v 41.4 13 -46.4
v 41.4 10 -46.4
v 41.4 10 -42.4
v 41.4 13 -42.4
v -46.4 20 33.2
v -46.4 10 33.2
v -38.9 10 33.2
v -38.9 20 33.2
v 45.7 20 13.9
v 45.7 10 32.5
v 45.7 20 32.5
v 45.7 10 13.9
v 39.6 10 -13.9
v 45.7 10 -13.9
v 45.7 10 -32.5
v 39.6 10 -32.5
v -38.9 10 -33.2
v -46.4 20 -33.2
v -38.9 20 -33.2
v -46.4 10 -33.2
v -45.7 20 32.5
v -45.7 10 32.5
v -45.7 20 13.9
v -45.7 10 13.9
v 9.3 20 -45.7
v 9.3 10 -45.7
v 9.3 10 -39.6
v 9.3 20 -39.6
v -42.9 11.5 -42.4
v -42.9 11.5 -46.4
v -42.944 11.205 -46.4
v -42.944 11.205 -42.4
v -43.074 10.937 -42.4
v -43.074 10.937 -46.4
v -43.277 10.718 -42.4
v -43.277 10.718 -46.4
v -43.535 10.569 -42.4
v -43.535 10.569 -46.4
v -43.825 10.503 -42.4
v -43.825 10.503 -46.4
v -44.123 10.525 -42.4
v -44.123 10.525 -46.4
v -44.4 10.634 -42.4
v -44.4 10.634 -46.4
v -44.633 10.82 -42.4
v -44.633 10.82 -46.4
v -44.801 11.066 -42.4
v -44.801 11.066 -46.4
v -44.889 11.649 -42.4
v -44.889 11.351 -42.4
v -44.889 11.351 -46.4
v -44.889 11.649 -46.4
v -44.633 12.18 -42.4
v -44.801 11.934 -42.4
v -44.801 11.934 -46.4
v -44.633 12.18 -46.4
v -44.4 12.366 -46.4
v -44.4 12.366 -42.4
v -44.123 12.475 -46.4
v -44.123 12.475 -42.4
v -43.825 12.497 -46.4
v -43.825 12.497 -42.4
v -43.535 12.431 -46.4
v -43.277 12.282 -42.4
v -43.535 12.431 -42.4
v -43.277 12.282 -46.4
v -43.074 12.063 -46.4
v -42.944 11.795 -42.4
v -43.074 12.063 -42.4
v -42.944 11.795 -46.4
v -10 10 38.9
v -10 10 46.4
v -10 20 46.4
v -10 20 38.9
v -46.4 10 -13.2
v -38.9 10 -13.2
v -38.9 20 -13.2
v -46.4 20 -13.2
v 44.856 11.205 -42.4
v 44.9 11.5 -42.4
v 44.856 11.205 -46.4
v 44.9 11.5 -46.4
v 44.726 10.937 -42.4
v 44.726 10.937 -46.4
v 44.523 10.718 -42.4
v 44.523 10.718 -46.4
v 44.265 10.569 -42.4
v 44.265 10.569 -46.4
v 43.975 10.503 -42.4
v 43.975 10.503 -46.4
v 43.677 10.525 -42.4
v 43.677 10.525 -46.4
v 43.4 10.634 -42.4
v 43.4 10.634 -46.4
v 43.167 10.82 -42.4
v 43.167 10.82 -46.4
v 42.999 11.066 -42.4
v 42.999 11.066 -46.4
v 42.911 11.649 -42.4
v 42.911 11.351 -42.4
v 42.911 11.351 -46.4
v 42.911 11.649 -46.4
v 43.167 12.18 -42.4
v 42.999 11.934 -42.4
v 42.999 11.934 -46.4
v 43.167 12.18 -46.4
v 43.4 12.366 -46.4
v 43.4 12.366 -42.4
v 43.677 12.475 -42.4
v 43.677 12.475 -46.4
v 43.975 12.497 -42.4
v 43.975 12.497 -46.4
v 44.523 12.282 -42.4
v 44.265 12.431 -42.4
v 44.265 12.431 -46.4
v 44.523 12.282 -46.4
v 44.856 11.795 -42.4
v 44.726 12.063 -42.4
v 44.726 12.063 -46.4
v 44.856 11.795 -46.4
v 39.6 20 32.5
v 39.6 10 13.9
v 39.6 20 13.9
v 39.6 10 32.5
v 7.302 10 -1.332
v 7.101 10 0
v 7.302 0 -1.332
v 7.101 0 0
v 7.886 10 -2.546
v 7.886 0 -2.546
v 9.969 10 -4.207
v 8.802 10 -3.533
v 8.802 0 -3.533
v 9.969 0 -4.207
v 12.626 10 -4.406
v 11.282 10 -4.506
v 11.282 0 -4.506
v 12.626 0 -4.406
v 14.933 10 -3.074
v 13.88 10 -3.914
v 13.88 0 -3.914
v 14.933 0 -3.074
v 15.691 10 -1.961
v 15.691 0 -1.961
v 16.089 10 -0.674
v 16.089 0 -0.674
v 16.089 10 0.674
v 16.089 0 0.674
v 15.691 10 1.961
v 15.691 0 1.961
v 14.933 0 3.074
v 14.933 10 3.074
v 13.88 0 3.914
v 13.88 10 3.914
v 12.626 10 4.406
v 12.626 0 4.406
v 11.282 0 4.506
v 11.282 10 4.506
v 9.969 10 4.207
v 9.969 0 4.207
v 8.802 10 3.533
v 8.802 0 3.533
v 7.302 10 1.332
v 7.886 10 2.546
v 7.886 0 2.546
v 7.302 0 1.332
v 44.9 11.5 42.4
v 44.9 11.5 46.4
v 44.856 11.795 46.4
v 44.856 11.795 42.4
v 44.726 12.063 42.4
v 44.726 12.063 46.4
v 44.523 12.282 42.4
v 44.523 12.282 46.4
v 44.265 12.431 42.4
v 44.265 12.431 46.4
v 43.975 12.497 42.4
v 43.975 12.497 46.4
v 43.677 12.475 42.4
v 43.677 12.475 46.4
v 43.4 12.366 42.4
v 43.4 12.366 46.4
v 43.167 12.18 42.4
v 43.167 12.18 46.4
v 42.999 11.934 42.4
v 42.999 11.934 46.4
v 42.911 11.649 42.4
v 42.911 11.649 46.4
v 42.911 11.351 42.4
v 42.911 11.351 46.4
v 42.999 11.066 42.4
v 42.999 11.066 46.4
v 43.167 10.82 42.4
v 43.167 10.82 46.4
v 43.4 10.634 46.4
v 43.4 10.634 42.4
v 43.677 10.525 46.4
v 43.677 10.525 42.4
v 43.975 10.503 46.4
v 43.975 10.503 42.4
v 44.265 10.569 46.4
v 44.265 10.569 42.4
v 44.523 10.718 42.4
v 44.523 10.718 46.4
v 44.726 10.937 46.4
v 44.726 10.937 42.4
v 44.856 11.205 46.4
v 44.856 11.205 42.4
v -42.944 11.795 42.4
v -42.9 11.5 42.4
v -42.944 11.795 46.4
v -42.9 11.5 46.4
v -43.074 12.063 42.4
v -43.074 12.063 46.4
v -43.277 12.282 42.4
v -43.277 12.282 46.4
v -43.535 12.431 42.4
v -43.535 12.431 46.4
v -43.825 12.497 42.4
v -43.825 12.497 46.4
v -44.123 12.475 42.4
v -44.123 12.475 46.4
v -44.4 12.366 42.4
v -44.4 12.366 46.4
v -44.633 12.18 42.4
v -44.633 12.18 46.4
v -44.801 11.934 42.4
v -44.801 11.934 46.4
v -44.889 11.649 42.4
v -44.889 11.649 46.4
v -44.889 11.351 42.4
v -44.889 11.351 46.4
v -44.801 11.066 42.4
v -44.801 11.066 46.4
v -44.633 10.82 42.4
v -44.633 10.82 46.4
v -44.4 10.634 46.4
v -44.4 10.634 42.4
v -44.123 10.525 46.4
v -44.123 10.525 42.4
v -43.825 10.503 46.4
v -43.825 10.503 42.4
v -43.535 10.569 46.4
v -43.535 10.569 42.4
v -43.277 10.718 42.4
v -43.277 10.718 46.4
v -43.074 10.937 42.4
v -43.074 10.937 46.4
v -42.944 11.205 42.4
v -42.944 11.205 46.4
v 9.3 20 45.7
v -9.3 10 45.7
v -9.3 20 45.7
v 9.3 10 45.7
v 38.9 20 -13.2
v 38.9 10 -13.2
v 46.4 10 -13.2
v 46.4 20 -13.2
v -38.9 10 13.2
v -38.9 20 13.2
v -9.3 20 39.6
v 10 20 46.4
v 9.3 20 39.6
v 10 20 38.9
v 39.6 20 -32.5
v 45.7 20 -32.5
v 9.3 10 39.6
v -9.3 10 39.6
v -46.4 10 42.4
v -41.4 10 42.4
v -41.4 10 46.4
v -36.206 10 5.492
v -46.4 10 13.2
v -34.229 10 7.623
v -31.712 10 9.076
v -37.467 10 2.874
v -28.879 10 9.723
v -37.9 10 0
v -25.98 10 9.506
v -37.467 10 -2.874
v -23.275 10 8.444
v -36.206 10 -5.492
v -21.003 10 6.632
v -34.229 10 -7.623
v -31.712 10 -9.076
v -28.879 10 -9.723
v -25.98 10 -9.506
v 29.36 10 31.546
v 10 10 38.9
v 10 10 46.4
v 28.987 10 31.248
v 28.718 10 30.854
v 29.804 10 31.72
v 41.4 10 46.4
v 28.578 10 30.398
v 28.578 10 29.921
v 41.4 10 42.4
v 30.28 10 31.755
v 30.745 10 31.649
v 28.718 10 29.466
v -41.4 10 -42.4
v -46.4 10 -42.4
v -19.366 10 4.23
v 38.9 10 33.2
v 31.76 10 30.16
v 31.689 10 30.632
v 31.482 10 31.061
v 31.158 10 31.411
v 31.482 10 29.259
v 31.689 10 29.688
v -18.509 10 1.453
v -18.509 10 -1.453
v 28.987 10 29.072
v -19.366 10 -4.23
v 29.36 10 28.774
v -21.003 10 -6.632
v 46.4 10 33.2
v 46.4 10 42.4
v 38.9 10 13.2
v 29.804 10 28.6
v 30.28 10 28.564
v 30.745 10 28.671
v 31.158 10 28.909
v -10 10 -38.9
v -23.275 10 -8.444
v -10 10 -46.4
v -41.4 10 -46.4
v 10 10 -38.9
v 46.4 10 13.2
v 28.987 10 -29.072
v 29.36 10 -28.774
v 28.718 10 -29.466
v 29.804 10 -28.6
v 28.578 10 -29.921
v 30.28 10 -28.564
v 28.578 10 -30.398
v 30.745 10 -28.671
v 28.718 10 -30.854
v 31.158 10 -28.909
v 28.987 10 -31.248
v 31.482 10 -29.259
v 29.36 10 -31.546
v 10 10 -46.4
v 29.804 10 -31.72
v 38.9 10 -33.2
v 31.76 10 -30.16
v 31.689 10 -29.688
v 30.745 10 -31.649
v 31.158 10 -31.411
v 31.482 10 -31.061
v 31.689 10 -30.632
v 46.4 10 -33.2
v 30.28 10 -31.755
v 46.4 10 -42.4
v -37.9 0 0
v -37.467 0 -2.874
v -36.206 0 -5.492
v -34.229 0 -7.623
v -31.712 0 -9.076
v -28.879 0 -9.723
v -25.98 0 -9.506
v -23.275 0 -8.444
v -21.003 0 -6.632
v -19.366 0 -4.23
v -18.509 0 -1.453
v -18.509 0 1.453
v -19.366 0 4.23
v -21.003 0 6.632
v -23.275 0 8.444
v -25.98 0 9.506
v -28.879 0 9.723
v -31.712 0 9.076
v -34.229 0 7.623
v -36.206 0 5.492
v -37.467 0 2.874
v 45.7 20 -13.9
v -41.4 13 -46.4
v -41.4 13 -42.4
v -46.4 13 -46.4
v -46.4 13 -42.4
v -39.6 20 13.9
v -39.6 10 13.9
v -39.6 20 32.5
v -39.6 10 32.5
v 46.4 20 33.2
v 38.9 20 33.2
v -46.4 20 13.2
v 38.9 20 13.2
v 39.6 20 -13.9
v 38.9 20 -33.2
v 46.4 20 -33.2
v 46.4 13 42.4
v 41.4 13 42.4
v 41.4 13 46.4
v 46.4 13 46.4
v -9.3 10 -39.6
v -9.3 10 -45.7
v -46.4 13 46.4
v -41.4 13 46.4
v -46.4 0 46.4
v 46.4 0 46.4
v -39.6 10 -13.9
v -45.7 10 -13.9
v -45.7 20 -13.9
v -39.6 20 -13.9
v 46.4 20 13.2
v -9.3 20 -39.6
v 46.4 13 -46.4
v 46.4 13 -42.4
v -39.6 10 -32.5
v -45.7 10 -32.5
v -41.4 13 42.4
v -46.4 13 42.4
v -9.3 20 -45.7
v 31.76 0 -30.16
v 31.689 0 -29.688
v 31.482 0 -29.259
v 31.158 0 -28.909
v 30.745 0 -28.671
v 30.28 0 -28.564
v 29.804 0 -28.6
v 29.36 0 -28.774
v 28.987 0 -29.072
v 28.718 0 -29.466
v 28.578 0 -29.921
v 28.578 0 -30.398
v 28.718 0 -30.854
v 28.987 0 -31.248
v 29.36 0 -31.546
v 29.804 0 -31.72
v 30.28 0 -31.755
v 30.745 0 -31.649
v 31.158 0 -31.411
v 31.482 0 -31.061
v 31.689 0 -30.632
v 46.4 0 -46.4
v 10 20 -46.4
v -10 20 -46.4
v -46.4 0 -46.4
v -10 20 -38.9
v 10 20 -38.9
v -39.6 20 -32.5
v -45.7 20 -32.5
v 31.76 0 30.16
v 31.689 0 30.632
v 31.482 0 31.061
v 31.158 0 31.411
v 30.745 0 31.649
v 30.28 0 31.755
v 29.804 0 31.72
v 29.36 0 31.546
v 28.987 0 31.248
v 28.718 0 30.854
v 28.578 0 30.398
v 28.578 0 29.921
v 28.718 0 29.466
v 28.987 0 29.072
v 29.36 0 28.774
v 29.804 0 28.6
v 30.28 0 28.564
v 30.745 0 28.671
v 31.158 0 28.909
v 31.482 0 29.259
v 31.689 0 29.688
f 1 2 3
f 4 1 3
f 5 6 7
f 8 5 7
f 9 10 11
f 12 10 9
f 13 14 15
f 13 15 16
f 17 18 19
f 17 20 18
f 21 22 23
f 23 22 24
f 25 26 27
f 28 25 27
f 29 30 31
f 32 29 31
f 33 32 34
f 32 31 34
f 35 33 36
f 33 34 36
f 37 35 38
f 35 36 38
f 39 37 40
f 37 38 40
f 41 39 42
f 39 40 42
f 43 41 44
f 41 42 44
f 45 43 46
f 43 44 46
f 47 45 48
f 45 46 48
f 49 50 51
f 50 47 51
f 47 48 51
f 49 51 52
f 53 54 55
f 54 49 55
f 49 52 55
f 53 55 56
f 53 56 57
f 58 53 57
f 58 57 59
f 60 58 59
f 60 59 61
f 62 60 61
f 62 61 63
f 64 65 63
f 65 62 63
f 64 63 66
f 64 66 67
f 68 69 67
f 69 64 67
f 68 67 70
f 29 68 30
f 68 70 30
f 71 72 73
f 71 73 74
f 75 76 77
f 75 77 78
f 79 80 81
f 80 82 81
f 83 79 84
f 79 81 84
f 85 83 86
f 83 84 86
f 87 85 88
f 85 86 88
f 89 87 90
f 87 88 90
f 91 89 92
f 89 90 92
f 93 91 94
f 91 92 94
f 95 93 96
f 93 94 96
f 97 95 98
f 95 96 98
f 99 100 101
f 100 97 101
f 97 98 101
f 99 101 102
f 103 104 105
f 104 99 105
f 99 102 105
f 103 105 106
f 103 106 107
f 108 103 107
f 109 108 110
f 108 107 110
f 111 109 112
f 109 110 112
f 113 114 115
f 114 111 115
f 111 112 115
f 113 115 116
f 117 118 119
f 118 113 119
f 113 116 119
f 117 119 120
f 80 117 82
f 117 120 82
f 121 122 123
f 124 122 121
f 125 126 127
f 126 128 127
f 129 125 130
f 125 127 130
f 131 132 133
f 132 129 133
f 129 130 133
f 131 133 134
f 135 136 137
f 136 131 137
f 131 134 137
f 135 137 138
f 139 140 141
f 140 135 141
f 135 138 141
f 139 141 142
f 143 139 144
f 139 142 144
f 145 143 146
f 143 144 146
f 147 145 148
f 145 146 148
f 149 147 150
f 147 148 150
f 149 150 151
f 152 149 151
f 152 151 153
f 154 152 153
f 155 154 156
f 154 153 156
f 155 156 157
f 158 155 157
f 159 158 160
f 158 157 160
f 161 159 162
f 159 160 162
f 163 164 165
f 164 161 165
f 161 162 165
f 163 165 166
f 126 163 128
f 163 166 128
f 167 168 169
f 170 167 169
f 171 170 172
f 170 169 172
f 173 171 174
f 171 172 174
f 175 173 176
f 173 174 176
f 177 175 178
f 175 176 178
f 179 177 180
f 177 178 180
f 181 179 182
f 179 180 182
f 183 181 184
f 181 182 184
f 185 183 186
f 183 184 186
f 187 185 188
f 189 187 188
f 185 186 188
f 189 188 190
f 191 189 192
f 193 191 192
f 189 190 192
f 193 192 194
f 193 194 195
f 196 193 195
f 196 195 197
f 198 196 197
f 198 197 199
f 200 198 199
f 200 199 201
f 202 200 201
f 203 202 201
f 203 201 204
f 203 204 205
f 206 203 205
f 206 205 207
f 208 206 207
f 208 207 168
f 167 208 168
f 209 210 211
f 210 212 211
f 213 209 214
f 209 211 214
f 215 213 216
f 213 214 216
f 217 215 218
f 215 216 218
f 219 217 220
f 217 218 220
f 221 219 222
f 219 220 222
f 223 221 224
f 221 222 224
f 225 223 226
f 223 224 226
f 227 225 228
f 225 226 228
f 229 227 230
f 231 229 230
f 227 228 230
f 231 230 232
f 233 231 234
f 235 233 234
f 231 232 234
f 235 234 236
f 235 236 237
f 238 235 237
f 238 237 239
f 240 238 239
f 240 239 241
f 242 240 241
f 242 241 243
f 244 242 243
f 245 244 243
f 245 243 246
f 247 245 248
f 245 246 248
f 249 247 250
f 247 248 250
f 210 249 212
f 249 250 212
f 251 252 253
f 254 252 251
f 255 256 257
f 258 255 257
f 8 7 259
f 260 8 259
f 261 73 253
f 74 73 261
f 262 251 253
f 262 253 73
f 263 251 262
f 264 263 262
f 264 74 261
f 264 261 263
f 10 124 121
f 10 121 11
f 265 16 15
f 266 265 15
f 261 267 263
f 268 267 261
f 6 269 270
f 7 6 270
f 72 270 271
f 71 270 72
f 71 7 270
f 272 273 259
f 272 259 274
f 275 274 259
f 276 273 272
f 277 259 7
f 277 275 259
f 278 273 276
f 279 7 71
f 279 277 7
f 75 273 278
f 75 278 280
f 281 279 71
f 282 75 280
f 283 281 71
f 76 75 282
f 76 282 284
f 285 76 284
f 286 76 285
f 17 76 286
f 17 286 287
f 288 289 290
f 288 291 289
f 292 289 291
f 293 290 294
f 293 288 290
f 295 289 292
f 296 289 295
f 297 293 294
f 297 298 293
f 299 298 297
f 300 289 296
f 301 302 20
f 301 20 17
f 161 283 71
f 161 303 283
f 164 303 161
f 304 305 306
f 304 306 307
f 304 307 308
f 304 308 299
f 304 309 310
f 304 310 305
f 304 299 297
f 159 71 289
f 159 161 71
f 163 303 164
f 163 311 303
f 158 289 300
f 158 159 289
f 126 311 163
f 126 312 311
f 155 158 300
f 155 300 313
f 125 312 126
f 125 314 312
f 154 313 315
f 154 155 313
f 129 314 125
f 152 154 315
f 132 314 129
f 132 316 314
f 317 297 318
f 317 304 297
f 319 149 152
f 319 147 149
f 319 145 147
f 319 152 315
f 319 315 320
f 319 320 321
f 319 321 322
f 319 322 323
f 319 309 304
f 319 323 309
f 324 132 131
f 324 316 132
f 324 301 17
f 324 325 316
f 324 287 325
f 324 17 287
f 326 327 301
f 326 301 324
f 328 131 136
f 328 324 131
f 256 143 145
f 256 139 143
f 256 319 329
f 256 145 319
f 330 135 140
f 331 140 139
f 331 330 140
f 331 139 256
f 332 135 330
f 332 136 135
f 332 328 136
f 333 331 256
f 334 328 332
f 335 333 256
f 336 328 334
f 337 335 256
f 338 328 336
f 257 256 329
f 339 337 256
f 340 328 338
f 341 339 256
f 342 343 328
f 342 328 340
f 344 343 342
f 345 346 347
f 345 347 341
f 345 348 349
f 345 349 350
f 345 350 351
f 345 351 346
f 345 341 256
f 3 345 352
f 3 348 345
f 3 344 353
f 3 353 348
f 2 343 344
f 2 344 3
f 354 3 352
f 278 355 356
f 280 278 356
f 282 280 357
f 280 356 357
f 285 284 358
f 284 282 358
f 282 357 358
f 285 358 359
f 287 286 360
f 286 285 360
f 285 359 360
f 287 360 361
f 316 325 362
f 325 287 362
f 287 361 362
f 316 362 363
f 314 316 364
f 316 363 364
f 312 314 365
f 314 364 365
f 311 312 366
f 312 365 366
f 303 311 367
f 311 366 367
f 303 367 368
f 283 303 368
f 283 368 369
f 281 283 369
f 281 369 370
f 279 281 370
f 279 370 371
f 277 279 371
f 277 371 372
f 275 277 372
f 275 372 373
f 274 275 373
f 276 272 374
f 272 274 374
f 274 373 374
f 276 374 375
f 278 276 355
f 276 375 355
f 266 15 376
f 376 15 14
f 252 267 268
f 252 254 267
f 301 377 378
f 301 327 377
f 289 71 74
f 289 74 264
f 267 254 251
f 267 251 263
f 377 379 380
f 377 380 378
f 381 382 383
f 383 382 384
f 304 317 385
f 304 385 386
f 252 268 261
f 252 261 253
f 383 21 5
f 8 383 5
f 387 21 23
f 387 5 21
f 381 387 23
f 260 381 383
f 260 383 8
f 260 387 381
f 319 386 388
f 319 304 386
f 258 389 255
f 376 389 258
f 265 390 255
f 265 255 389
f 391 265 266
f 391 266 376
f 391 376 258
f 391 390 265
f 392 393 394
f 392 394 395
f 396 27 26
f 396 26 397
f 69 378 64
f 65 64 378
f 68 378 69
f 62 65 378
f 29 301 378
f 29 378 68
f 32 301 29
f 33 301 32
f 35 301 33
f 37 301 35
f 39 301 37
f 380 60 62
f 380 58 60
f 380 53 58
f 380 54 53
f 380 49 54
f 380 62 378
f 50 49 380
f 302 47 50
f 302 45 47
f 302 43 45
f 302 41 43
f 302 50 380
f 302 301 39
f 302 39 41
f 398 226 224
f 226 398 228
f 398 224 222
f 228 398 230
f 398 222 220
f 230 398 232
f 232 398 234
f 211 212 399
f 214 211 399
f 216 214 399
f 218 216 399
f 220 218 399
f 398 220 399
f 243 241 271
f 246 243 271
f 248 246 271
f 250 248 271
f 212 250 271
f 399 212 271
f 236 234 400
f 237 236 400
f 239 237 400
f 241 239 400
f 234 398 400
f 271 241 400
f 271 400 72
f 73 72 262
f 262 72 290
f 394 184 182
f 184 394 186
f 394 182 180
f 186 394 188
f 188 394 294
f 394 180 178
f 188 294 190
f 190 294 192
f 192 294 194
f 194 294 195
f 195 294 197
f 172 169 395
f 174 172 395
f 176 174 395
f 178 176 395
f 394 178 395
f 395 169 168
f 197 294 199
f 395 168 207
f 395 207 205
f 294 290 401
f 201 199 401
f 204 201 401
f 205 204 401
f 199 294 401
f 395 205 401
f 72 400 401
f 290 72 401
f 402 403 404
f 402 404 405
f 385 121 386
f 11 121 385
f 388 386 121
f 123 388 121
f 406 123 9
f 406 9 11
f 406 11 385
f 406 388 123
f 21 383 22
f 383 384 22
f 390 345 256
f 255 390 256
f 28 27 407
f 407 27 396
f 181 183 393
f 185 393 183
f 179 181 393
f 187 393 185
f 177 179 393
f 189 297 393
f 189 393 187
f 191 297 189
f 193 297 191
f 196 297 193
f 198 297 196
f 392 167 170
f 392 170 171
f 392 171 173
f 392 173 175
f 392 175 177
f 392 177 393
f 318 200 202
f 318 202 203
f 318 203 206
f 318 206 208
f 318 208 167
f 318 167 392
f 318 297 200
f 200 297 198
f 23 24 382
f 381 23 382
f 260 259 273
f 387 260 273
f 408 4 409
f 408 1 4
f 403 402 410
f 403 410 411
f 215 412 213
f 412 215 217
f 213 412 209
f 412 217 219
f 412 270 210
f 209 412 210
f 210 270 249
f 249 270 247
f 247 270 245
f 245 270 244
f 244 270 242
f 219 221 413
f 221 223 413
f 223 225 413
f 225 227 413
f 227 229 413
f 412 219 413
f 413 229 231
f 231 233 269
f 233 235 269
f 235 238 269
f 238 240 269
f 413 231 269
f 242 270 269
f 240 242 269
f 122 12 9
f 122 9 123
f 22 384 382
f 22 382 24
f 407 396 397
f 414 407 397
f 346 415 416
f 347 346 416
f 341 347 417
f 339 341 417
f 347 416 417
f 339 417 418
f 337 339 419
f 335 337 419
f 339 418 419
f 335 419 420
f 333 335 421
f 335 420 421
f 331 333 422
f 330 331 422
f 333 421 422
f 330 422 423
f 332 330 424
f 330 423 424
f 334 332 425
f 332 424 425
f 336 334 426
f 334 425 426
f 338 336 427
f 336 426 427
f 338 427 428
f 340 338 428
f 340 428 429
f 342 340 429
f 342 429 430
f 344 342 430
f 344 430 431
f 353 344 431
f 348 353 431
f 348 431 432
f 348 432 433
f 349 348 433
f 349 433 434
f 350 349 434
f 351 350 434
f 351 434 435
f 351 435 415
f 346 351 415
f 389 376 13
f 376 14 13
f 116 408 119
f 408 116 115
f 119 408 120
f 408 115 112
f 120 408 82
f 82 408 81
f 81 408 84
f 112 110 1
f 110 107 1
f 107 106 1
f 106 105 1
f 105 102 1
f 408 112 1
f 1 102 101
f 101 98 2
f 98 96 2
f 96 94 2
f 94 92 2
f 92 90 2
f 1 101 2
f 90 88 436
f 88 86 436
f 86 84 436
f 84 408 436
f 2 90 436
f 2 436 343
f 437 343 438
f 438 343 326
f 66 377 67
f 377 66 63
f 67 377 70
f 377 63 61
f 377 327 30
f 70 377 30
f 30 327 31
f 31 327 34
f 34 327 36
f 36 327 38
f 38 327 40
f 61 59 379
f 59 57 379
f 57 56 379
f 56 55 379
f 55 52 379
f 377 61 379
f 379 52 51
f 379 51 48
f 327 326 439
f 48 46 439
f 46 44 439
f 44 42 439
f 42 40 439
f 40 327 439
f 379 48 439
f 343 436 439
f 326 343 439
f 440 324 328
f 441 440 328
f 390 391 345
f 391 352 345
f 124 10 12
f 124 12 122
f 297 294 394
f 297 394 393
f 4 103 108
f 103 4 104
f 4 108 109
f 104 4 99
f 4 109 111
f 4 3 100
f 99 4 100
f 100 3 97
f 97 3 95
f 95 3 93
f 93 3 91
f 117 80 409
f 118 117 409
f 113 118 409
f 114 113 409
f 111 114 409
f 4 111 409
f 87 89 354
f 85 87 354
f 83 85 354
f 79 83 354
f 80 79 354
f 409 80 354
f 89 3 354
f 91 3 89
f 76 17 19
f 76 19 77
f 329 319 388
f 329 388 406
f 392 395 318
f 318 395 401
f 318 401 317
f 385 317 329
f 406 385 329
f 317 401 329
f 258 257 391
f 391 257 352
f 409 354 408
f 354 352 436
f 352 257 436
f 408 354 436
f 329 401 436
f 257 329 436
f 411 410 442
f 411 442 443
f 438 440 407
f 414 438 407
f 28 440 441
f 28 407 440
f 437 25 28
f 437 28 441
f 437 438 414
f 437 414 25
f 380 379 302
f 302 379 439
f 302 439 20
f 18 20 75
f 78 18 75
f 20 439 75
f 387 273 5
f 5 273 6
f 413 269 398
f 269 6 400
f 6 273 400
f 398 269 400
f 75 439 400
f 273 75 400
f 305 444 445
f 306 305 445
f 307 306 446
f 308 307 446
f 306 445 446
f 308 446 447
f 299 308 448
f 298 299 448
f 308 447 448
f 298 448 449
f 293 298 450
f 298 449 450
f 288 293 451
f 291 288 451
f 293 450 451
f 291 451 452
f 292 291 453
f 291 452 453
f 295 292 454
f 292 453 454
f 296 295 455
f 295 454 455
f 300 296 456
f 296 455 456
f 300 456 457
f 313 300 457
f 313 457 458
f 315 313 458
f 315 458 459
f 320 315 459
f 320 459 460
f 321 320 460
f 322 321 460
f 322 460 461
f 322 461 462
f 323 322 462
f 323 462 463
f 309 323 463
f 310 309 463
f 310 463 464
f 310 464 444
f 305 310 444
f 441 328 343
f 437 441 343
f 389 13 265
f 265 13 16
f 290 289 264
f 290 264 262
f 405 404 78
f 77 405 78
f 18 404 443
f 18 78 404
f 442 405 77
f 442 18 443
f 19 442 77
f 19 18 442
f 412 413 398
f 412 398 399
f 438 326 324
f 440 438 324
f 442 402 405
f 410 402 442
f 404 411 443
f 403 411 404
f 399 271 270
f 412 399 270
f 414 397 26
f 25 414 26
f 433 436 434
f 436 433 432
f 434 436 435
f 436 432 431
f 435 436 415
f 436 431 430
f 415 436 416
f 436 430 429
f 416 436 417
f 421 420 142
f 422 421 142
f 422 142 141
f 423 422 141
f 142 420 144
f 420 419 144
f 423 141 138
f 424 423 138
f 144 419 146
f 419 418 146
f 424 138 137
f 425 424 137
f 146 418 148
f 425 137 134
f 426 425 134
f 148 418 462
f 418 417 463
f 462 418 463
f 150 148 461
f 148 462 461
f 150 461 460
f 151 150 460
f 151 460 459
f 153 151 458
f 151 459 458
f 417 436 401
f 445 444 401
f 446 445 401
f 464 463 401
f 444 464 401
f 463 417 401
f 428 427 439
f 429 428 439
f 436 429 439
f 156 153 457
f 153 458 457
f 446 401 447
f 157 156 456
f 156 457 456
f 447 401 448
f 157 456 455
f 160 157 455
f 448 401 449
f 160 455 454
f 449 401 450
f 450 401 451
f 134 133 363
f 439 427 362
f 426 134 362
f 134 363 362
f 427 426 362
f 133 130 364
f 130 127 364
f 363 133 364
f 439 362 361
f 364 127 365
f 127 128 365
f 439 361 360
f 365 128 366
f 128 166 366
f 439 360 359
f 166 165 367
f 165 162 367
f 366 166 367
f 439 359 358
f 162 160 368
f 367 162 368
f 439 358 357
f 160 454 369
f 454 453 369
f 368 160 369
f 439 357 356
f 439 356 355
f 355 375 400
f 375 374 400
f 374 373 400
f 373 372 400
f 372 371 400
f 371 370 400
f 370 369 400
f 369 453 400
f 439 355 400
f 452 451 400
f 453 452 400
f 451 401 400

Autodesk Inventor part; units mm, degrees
ref_plane "YZ Plane" through (0, 0, 0) normal (1, 0, 0) x (0, 1, 0)
ref_plane "XZ Plane" through (0, 0, 0) normal (0, 1, 0) x (-1, 0, 0)
ref_plane "XY Plane" through (0, 0, 0) normal (0, 0, 1) x (1, 0, 0)
sketch "Sketch1" plane through (0, 0, 0) normal (0, 1, 0) x (-1, 0, 0)
  line L0 (-46.4, 46.4) -> (-46.4, -46.4)
  line L1 (-46.4, -46.4) -> (46.4, -46.4)
  line L2 (46.4, -46.4) -> (46.4, 46.4)
  line L3 (46.4, 46.4) -> (-46.4, 46.4)
  line L4 (-46.4, 46.4) -> (46.4, -46.4) construction
  line L5 (-46.4, -46.4) -> (46.4, 46.4) construction
  circle A0 centre (28.15, 0) radius 9.75
  line L6 (-11.62, 56.3044) -> (-11.62, -68.4085) construction
  line L7 (13.88, 18.1678) -> (13.88, -16.702) construction
  line L8 (16.845, 0) -> (-37.12, 0) construction
  line L9 (-37.12, 0) -> (-37.12, -16.702) construction
  line L10 (-37.12, -16.702) -> (-37.12, 16.702) construction
  line L11 (-37.12, 16.702) -> (13.88, 16.702) construction
  line L12 (-37.12, -16.702) -> (13.88, -16.702) construction
  line L13 (13.88, 0) -> (6.92, 0) construction
  circle A1 centre (6.92, 0) radius 4.519 construction
  circle A2 centre (6.92, 0) radius 4.519
  circle A3 centre (-30.16, 0) radius 4.519
  circle A4 centre (-11.62, 0) radius 4.519
  point P0 (0, 0)
  dimension "d0" = 92.8
  dimension "d1" = 92.8
  dimension "d2" = 19.5
  dimension "d3" = 28.15
  dimension "d4" = 11.62
  dimension "d8" = 16.702
  dimension "d9" = 33.404
  dimension "d10" = 6.96
  dimension "d11" = 9.038
  dimension "d46" = 9.038
  dimension "d47" = 6.96
  dimension "d50" = 9.038
extrude "Extrusion1" add sketch "Sketch1" along normal blind 10 contours L3 L2 L1 L0 | A3 | A4
sketch "Sketch2" plane through (0, 10, 0) normal (0, 1, 0) x (1, 0, 0)
  line L0 (-46.4, 46.4) -> (-46.4, -46.4) projected
  line L1 (46.4, -46.4) -> (46.4, 46.4) projected
  line L2 (-46.4, -46.4) -> (46.4, 46.4) construction
  line L3 (-46.4, 46.4) -> (46.4, -46.4) construction
  line L4 (-46.4, -44.4) -> (46.4, -44.4) construction
  line L5 (-46.4, 44.4) -> (46.4, 44.4) construction
  line L6 (46.4, 46.4) -> (-46.4, 46.4) construction
  line L7 (-43.9, 46.4) -> (-43.9, -46.4) construction
  line L8 (-46.4, -46.4) -> (46.4, -46.4) construction
  line L9 (43.9, -46.4) -> (43.9, 46.4) construction
  line L10 (-41.4, -42.4) -> (-46.4, -42.4)
  line L11 (-46.4, -42.4) -> (-46.4, -46.4)
  line L12 (-46.4, -46.4) -> (-41.4, -46.4)
  line L13 (-41.4, -46.4) -> (-41.4, -42.4)
  line L14 (-41.4, -42.4) -> (-46.4, -46.4) construction
  line L15 (-46.4, -42.4) -> (-41.4, -46.4) construction
  line L16 (-41.4, 42.4) -> (-46.4, 42.4)
  line L17 (-46.4, 42.4) -> (-46.4, 46.4)
  line L18 (-46.4, 46.4) -> (-41.4, 46.4)
  line L19 (-41.4, 46.4) -> (-41.4, 42.4)
  line L20 (-41.4, 42.4) -> (-46.4, 46.4) construction
  line L21 (-46.4, 42.4) -> (-41.4, 46.4) construction
  line L22 (41.4, 42.4) -> (46.4, 42.4)
  line L23 (46.4, 42.4) -> (46.4, 46.4)
  line L24 (46.4, 46.4) -> (41.4, 46.4)
  line L25 (41.4, 46.4) -> (41.4, 42.4)
  line L26 (41.4, 42.4) -> (46.4, 46.4) construction
  line L27 (46.4, 42.4) -> (41.4, 46.4) construction
  line L28 (41.4, -42.4) -> (46.4, -42.4)
  line L29 (46.4, -42.4) -> (46.4, -46.4)
  line L30 (46.4, -46.4) -> (41.4, -46.4)
  line L31 (41.4, -46.4) -> (41.4, -42.4)
  line L32 (41.4, -42.4) -> (46.4, -46.4) construction
  line L33 (46.4, -42.4) -> (41.4, -46.4) construction
  point P0 (0, 0)
  point P1 (-43.9, -44.4)
  point P2 (-43.9, 44.4)
  point P3 (43.9, 44.4)
  point P4 (43.9, -44.4)
  dimension "d14" = 2.5
  dimension "d15" = 2.5
  dimension "d16" = 2
  dimension "d17" = 2
extrude "Extrusion2" add sketch "Sketch2" along normal blind 3
sketch "Sketch3" plane through (-46.4, 0, 46.4) normal (0, 0, 1) x (1, 0, 0)
  line L0 (0, 10) -> (5, 10) construction
  line L1 (0, 10) -> (92.9772, 10) construction
  line L2 (0, 10) -> (0, 13) construction
  line L3 (5, 10) -> (0, 13) construction
  line L4 (0, 13) -> (5, 13) construction
  line L5 (5, 13) -> (0, 10) construction
  line L6 (92.8, 0) -> (92.8, 13) construction
  line L7 (87.8, 13) -> (92.8, 13) construction
  line L8 (92.8, 10) -> (87.8, 13) construction
  line L9 (87.8, 13) -> (87.8, 10) construction
  line L10 (87.8, 10) -> (92.8, 13) construction
  circle A0 centre (90.3, 11.5) radius 1 construction
  circle A1 centre (90.3, 11.5) radius 1
  circle A2 centre (2.5, 11.5) radius 1
  point P0 (46.4, 0)
  dimension "d20" = 2
  dimension "d21" = 2
sketch "Sketch4" plane through (0, 10, 0) normal (0, 1, 0) x (1, 0, 0)
  line L0 (0, -35.0564) -> (0, -55.3914) construction
  line L1 (-41.4, -46.4) -> (41.4, -46.4) projected
  line L2 (0, -46.4) -> (-10, -46.4)
  line L3 (-10, -46.4) -> (-10, -38.9)
  line L4 (-10, -38.9) -> (10, -38.9)
  line L5 (10, -38.9) -> (10, -46.4)
  line L6 (0, -46.4) -> (10, -46.4)
  line L7 (-23.157, 0) -> (-56.7416, 0) construction
  line L8 (-56.7416, 0) -> (-56.7416, -46.4) construction
  line L9 (-56.7416, -46.4) -> (-46.4, -46.4) construction
  line L10 (-46.4, -46.4) -> (-56.7416, -23.2) construction
  line L11 (-31.4038, -23.2) -> (-56.7416, -23.2) construction
  line L12 (-46.4, 42.4) -> (-46.4, -42.4) projected
  line L13 (-46.4, -23.2) -> (-46.4, -33.2)
  line L14 (-46.4, -33.2) -> (-38.9, -33.2)
  line L15 (-38.9, -33.2) -> (-38.9, -13.2)
  line L16 (-38.9, -13.2) -> (-46.4, -13.2)
  line L17 (-46.4, -13.2) -> (-46.4, -23.2)
  line L18 (-50.628, 0) -> (47.2568, 0) construction
  line L19 (0, -71.9527) -> (0, 59.9713) construction
  line L20 (46.4, -23.2) -> (46.4, -33.2)
  line L21 (46.4, -33.2) -> (38.9, -33.2)
  line L22 (38.9, -33.2) -> (38.9, -13.2)
  line L23 (38.9, -13.2) -> (46.4, -13.2)
  line L24 (46.4, -13.2) -> (46.4, -23.2)
  line L25 (0, 46.4) -> (-10, 46.4)
  line L26 (-10, 46.4) -> (-10, 38.9)
  line L27 (-10, 38.9) -> (10, 38.9)
  line L28 (10, 38.9) -> (10, 46.4)
  line L29 (0, 46.4) -> (10, 46.4)
  line L30 (-46.4, 23.2) -> (-46.4, 33.2)
  line L31 (-46.4, 33.2) -> (-38.9, 33.2)
  line L32 (-38.9, 33.2) -> (-38.9, 13.2)
  line L33 (-38.9, 13.2) -> (-46.4, 13.2)
  line L34 (-46.4, 13.2) -> (-46.4, 23.2)
  line L35 (46.4, 33.2) -> (38.9, 33.2)
  line L36 (38.9, 33.2) -> (38.9, 13.2)
  line L37 (38.9, 13.2) -> (46.4, 13.2)
  line L38 (46.4, 13.2) -> (46.4, 23.2)
  line L39 (46.4, 23.2) -> (46.4, 33.2)
  line L40 (9.3, -39.6) -> (-9.3, -39.6) construction
  line L41 (-9.3, -39.6) -> (-9.3, -45.7) construction
  line L42 (-9.3, -45.7) -> (0, -45.7) construction
  line L43 (0, -45.7) -> (9.3, -45.7) construction
  line L44 (9.3, -45.7) -> (9.3, -39.6) construction
  line L45 (-9.3, -39.6) -> (-9.3, -45.7)
  line L46 (-9.3, -45.7) -> (0, -45.7)
  line L47 (0, -45.7) -> (9.3, -45.7)
  line L48 (9.3, -45.7) -> (9.3, -39.6)
  line L49 (9.3, -39.6) -> (-9.3, -39.6)
  line L50 (-39.6, -13.9) -> (-39.6, -32.5)
  line L51 (-39.6, -32.5) -> (-45.7, -32.5)
  line L52 (-45.7, -32.5) -> (-45.7, -23.2)
  line L53 (-45.7, -23.2) -> (-45.7, -13.9)
  line L54 (-45.7, -13.9) -> (-39.6, -13.9)
  line L55 (-45.7, 13.9) -> (-39.6, 13.9)
  line L56 (-39.6, 13.9) -> (-39.6, 32.5)
  line L57 (-39.6, 32.5) -> (-45.7, 32.5)
  line L58 (-45.7, 32.5) -> (-45.7, 23.2)
  line L59 (-45.7, 23.2) -> (-45.7, 13.9)
  line L60 (9.3, 39.6) -> (-9.3, 39.6)
  line L61 (-9.3, 39.6) -> (-9.3, 45.7)
  line L62 (-9.3, 45.7) -> (0, 45.7)
  line L63 (0, 45.7) -> (9.3, 45.7)
  line L64 (9.3, 45.7) -> (9.3, 39.6)
  line L65 (39.6, 13.9) -> (39.6, 32.5)
  line L66 (39.6, 32.5) -> (45.7, 32.5)
  line L67 (45.7, 32.5) -> (45.7, 23.2)
  line L68 (45.7, 23.2) -> (45.7, 13.9)
  line L69 (45.7, 13.9) -> (39.6, 13.9)
  line L70 (39.6, -13.9) -> (39.6, -32.5)
  line L71 (39.6, -32.5) -> (45.7, -32.5)
  line L72 (45.7, -32.5) -> (45.7, -23.2)
  line L73 (45.7, -23.2) -> (45.7, -13.9)
  line L74 (45.7, -13.9) -> (39.6, -13.9)
  point P0 (0, 0)
  dimension "d22" = 10
  dimension "d23" = 7.5
  dimension "d24" = 20
  dimension "d25" = 10
  dimension "d26" = 7.5
  dimension "d27" = 20
  dimension "d28" = 0.7
  dimension "d29" = 0.7
  dimension "d30" = 0.7
  dimension "d31" = 0.7
  dimension "d32" = 0.7
  dimension "d33" = 0.7
  dimension "d34" = 0.7
extrude "Extrusion3" add sketch "Sketch4" along normal blind 10
extrude "Extrusion5" cut sketch "Sketch3" against normal blind 4
ref_plane "Work Plane1" through (46.4, 0, 0) normal (0, 0, -1) x (-1, 0, 0)
mirror "Mirror1" about plane through (46.4, 0, 0) normal (0, 0, -1) of "Extrusion5"
sketch "Sketch6" plane through (0, 10, 0) normal (0, 1, 0) x (1, 0, 0)
  circle A0 centre (-28.15, 0) radius 9.75 projected
  circle A1 centre (-6.92, 0) radius 4.519 projected
  line L0 (10, 46.4) -> (10, 38.9) projected
  line L1 (10, 38.9) -> (-10, 38.9) projected
  line L2 (-10, 38.9) -> (-10, 46.4) projected
  line L3 (-10, 46.4) -> (-41.4, 46.4) projected
  line L4 (-41.4, 46.4) -> (-41.4, 42.4) projected
  line L5 (-41.4, 42.4) -> (-46.4, 42.4) projected
  line L6 (-46.4, 42.4) -> (-46.4, 33.2) projected
  line L7 (-46.4, 33.2) -> (-38.9, 33.2) projected
  line L8 (-38.9, 33.2) -> (-38.9, 13.2) projected
  line L9 (-38.9, 13.2) -> (-46.4, 13.2) projected
  line L10 (-46.4, 13.2) -> (-46.4, -13.2) projected
  line L11 (-46.4, -13.2) -> (-38.9, -13.2) projected
  line L12 (-38.9, -13.2) -> (-38.9, -33.2) projected
  line L13 (-38.9, -33.2) -> (-46.4, -33.2) projected
  line L14 (-46.4, -33.2) -> (-46.4, -42.4) projected
  line L15 (-46.4, -42.4) -> (-41.4, -42.4) projected
  line L16 (-41.4, -42.4) -> (-41.4, -46.4) projected
  line L17 (-41.4, -46.4) -> (-10, -46.4) projected
  line L18 (-10, -46.4) -> (-10, -38.9) projected
  line L19 (-10, -38.9) -> (10, -38.9) projected
  line L20 (10, -38.9) -> (10, -46.4) projected
  line L21 (10, -46.4) -> (41.4, -46.4) projected
  line L22 (41.4, -46.4) -> (41.4, -42.4) projected
  line L23 (41.4, -42.4) -> (46.4, -42.4) projected
  line L24 (46.4, -42.4) -> (46.4, -33.2) projected
  line L25 (46.4, -33.2) -> (38.9, -33.2) projected
  line L26 (38.9, -33.2) -> (38.9, -13.2) projected
  line L27 (38.9, -13.2) -> (46.4, -13.2) projected
  line L28 (46.4, -13.2) -> (46.4, 13.2) projected
  line L29 (46.4, 13.2) -> (38.9, 13.2) projected
  line L30 (38.9, 13.2) -> (38.9, 33.2) projected
  line L31 (38.9, 33.2) -> (46.4, 33.2) projected
  line L32 (46.4, 33.2) -> (46.4, 42.4) projected
  line L33 (46.4, 42.4) -> (41.4, 42.4) projected
  line L34 (41.4, 42.4) -> (41.4, 46.4) projected
  line L35 (41.4, 46.4) -> (10, 46.4) projected
  point P0 (0, 0)
extrude "Extrusion7" add sketch "Sketch6" against normal blind 10 contours A1
extrude "Extrusion9" cut sketch "Sketch1" along normal blind 10 contours A4
sketch "Sketch7" plane through (0, 0, 0) normal (0, -1, 0) x (1, 0, 0)
  line L0 (30.16, 0) -> (30.16, -46.4) construction
  line L1 (41.4, -46.4) -> (10, -46.4) projected
sketch "Sketch8" plane through (0, 0, 0) normal (0, -1, 0) x (1, 0, 0)
  circle A0 centre (11.62, 0) radius 4.519 projected
  circle A1 centre (-28.15, 0) radius 9.75 projected
  line L0 (46.4, 46.4) -> (46.4, -46.4) projected
  line L1 (-46.4, 46.4) -> (46.4, 46.4) projected
  line L2 (-46.4, -46.4) -> (-46.4, 46.4) projected
  line L3 (46.4, -46.4) -> (-46.4, -46.4) projected
  circle A2 centre (30.16, 0) radius 4.519 projected
  circle A3 centre (11.62, 0) radius 4.519 projected
  circle A4 centre (-28.15, 0) radius 9.75 projected
  line L4 (46.4, 46.4) -> (46.4, -46.4) projected
  line L5 (-46.4, 46.4) -> (46.4, 46.4) projected
  line L6 (-46.4, -46.4) -> (-46.4, 46.4) projected
  line L7 (46.4, -46.4) -> (-46.4, -46.4) projected
  line L8 (30.16, 0) -> (30.16, 46.8649) construction
  circle A5 centre (30.16, 30.1599) radius 1.6
  line L9 (55.9453, 0) -> (-55.3311, 0) construction
  line L10 (30.16, 0) -> (30.16, -46.8649) construction
  circle A6 centre (30.16, -30.1599) radius 1.6
  point P0 (0, 0)
  dimension "d53" = 3.2
  dimension "d54" = 30.1599
  dimension "d55" = 30.1599
extrude "Extrusion10" cut sketch "Sketch8" against normal up to surface (10 mm away) contours A5 | A6
properties part number "Lifting Platform With Balance"
